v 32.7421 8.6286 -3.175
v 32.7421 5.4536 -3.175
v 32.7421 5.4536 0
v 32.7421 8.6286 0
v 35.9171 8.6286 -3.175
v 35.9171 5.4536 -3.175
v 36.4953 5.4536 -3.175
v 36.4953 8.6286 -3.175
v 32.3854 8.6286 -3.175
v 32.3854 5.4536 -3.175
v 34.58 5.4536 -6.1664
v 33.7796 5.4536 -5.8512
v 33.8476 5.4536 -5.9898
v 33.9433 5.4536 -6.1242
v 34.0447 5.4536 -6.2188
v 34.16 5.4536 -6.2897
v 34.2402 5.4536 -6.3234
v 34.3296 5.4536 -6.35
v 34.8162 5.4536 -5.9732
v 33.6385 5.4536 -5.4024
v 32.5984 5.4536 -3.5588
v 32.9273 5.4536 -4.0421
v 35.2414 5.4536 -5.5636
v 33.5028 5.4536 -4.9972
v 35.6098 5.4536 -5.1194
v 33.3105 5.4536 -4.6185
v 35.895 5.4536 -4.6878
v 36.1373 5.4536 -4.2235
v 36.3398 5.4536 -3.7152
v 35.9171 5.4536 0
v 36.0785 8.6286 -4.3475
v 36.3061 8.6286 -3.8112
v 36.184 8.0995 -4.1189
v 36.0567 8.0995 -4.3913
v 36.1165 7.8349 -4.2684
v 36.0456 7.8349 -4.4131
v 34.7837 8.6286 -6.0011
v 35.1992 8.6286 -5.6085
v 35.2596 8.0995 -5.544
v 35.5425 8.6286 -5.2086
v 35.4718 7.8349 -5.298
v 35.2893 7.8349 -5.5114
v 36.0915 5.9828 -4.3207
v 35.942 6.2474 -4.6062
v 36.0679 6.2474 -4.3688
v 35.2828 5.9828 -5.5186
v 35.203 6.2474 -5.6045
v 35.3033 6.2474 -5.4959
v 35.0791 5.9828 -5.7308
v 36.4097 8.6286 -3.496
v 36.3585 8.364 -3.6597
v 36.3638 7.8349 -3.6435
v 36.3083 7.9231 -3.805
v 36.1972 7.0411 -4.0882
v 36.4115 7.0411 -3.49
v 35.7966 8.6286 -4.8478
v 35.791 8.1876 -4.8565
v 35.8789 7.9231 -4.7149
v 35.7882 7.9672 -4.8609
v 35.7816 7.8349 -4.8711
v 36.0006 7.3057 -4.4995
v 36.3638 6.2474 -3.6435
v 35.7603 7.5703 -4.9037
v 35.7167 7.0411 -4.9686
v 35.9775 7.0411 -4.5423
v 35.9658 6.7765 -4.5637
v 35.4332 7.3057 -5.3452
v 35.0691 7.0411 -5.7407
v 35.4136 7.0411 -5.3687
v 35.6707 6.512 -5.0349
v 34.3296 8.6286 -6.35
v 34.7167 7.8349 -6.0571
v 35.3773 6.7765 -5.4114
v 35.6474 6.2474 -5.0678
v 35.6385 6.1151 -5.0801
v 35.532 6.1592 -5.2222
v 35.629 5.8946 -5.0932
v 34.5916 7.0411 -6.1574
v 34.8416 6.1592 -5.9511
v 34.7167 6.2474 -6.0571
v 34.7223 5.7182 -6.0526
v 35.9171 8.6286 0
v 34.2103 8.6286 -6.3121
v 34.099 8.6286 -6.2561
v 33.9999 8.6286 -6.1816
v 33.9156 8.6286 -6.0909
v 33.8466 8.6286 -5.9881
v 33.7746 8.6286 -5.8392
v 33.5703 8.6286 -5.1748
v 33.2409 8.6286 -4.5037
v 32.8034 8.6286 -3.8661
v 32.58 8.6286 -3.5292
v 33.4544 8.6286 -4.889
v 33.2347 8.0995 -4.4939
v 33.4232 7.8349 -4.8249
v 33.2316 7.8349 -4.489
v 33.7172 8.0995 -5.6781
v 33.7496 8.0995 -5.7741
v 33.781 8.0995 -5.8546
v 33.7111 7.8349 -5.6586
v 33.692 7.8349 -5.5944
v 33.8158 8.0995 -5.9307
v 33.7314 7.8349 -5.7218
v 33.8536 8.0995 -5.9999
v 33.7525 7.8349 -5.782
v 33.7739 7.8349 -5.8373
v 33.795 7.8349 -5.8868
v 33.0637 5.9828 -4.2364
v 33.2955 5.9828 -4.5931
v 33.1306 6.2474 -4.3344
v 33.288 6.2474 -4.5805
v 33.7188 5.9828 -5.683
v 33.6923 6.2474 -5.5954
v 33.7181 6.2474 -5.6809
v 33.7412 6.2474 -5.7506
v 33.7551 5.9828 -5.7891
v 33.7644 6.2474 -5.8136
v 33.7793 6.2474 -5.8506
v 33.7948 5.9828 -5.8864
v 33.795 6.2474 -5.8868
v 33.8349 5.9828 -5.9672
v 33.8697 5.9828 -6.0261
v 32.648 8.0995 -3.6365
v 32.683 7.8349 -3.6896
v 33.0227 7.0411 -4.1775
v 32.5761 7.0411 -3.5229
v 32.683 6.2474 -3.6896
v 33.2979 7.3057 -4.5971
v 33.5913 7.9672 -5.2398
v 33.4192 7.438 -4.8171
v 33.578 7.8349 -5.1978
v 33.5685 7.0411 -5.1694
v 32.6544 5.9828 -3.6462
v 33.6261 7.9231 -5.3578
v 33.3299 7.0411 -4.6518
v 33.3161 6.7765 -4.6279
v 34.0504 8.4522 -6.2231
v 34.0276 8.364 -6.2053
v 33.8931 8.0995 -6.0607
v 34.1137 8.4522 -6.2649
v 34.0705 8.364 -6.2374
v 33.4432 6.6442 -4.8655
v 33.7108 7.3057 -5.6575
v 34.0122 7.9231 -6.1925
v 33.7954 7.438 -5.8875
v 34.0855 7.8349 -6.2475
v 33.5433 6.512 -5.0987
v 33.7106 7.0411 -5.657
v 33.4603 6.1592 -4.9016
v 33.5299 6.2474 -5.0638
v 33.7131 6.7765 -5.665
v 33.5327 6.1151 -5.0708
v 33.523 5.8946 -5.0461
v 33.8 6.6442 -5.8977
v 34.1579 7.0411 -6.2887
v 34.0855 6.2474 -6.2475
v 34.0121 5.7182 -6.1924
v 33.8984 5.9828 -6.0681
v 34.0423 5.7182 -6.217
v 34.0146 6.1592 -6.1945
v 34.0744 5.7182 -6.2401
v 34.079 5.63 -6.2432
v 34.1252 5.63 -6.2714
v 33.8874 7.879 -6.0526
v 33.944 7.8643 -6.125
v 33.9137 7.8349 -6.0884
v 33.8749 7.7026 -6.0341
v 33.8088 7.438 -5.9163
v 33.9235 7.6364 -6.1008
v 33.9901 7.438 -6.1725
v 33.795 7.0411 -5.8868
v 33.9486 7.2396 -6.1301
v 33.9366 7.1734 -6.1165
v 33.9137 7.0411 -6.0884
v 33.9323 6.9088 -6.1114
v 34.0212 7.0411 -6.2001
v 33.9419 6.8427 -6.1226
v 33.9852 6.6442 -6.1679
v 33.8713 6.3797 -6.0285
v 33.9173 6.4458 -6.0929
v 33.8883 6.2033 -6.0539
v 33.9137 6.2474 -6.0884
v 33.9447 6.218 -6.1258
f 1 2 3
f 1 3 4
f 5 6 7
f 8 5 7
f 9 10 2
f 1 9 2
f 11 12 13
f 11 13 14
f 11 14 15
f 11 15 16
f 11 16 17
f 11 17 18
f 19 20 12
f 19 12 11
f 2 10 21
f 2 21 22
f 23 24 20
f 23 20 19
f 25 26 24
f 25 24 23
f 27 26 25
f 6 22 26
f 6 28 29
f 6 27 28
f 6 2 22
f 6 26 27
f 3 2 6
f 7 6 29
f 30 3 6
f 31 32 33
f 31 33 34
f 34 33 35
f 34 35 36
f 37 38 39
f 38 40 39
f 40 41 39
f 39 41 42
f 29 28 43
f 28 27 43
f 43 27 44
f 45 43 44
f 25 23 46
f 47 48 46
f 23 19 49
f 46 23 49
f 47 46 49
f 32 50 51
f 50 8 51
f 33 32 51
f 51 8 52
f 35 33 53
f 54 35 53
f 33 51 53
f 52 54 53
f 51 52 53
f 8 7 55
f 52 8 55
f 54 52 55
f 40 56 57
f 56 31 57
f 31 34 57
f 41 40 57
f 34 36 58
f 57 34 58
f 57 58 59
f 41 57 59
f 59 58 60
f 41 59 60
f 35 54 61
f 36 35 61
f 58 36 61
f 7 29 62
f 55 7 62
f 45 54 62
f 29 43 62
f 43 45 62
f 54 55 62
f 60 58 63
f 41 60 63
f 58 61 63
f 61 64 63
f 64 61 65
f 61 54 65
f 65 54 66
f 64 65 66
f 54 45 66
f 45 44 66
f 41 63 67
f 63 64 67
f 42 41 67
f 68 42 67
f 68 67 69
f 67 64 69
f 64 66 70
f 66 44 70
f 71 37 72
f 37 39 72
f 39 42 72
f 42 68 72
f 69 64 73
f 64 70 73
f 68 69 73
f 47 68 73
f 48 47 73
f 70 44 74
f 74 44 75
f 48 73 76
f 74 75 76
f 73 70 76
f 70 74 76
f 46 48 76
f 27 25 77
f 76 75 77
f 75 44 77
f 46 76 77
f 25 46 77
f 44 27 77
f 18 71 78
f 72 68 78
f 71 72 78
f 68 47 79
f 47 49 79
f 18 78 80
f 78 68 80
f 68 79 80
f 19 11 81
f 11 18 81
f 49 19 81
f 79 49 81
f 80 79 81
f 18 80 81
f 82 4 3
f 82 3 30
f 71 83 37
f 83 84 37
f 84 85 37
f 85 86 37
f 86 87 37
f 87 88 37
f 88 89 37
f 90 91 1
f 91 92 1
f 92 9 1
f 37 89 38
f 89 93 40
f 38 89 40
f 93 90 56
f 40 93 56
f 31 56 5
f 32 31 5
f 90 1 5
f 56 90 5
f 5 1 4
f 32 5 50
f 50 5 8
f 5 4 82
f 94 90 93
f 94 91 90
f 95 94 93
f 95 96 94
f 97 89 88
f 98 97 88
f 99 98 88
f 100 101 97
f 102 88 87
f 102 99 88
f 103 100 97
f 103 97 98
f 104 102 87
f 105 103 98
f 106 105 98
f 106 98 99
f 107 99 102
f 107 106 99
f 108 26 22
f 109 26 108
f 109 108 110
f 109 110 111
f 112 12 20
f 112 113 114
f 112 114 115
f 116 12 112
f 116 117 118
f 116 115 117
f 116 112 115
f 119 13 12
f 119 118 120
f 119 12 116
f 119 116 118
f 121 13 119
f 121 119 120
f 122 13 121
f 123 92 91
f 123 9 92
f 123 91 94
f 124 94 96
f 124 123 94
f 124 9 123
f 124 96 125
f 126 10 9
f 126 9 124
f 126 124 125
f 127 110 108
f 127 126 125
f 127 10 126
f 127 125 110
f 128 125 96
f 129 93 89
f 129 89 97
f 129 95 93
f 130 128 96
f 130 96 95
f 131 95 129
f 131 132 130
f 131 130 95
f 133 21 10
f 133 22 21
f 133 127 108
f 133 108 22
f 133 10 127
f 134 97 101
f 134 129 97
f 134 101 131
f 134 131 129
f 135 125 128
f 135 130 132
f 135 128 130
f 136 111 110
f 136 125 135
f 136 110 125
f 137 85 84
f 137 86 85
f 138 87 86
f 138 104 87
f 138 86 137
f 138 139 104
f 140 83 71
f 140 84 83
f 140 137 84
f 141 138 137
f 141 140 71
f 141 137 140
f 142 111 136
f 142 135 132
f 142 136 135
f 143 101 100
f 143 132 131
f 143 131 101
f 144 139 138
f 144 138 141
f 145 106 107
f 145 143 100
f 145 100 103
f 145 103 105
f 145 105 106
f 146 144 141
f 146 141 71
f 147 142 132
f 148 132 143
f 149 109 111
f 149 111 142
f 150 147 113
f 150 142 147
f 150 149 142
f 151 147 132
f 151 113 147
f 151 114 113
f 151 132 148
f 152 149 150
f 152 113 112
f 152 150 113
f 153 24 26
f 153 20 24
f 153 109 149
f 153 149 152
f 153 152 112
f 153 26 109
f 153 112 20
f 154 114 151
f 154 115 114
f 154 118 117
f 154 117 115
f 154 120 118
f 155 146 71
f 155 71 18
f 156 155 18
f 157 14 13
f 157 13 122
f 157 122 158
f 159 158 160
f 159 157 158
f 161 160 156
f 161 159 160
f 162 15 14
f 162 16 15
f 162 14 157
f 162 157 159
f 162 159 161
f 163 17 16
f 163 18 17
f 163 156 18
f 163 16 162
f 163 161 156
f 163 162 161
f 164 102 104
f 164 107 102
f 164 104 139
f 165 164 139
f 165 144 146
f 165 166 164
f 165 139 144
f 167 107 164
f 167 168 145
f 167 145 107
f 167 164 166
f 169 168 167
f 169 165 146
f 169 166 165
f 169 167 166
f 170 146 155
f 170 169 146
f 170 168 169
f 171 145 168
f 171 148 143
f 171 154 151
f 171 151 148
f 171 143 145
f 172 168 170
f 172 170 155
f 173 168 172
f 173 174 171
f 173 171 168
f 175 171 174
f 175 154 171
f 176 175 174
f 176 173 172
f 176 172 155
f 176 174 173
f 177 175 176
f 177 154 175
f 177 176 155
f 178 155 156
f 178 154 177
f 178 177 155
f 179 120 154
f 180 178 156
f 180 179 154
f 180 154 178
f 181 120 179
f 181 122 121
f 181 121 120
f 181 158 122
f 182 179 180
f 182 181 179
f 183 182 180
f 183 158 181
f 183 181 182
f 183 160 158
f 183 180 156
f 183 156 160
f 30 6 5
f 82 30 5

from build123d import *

# Parameters (mm, degrees)
SKETCH1_W           = 3.175
SKETCH1_H           = 3.175
BOSS_EXTRUDE1_DEPTH = 6.35
SKETCH2_W           = 6.35
SKETCH2_H           = 3.175
BOSS_EXTRUDE2_DEPTH = 3.175
CUT_EXTRUDE1_DEPTH  = 39.17066496


with BuildPart() as part:
    # Sketch1 → Boss-Extrude1 (new body)
    with BuildSketch(Plane.XY):
        with Locations((34.329620229, 7.041119721)):
            Rectangle(SKETCH1_W, SKETCH1_H)
    extrude(amount=-BOSS_EXTRUDE1_DEPTH)

    # Sketch2 → Boss-Extrude2 (add)
    with BuildSketch(Plane.XZ.offset(-5.453619721)):
        with Locations((34.329620229, -4.7625)):
            Rectangle(SKETCH2_W, SKETCH2_H)
    extrude(amount=-BOSS_EXTRUDE2_DEPTH)

    # Sketch3 → Cut-Extrude1 (cut, through all)
    with BuildSketch(Plane.XZ.offset(-5.453619721)):
        with BuildLine():
            Line((32.385431634, -3.175), (31.154620229, -3.175))
            Line((31.154620229, -3.175), (31.154620229, -6.35))
            Line((31.154620229, -6.35), (34.329620229, -6.35))
            add(Edge.make_bspline(
                [(32.385431634, -3.175), (32.718801205, -3.878392461), (33.690338088, -4.759412755), (33.756564545, -6.211143962), (34.329620229, -6.35)],
                knots=[0, 0, 0, 0, 0.611532208, 1, 1, 1, 1], degree=3))
        make_face()
        with BuildLine():
            add(Edge.make_bspline(
                [(36.495266727, -3.175), (36.021022313, -5.174773028), (34.329620229, -6.35)],
                knots=[0, 0, 0, 1, 1, 1], degree=2))
            Line((34.329620229, -6.35), (37.504620229, -6.35))
            Line((37.504620229, -6.35), (37.504620229, -3.175))
            Line((37.504620229, -3.175), (36.495266727, -3.175))
        make_face()
        Polygon((31.154620229, -3.175), (30.277564026, -3.175), (30.277564026, -6.620269694), (37.803879314, -6.620269694), (37.803879314, -3.175), (37.504620229, -3.175), (37.504620229, -6.35), (34.329620229, -6.35), (31.154620229, -6.35), align=None)
    extrude(amount=-CUT_EXTRUDE1_DEPTH, mode=Mode.SUBTRACT)


solid = part.part
